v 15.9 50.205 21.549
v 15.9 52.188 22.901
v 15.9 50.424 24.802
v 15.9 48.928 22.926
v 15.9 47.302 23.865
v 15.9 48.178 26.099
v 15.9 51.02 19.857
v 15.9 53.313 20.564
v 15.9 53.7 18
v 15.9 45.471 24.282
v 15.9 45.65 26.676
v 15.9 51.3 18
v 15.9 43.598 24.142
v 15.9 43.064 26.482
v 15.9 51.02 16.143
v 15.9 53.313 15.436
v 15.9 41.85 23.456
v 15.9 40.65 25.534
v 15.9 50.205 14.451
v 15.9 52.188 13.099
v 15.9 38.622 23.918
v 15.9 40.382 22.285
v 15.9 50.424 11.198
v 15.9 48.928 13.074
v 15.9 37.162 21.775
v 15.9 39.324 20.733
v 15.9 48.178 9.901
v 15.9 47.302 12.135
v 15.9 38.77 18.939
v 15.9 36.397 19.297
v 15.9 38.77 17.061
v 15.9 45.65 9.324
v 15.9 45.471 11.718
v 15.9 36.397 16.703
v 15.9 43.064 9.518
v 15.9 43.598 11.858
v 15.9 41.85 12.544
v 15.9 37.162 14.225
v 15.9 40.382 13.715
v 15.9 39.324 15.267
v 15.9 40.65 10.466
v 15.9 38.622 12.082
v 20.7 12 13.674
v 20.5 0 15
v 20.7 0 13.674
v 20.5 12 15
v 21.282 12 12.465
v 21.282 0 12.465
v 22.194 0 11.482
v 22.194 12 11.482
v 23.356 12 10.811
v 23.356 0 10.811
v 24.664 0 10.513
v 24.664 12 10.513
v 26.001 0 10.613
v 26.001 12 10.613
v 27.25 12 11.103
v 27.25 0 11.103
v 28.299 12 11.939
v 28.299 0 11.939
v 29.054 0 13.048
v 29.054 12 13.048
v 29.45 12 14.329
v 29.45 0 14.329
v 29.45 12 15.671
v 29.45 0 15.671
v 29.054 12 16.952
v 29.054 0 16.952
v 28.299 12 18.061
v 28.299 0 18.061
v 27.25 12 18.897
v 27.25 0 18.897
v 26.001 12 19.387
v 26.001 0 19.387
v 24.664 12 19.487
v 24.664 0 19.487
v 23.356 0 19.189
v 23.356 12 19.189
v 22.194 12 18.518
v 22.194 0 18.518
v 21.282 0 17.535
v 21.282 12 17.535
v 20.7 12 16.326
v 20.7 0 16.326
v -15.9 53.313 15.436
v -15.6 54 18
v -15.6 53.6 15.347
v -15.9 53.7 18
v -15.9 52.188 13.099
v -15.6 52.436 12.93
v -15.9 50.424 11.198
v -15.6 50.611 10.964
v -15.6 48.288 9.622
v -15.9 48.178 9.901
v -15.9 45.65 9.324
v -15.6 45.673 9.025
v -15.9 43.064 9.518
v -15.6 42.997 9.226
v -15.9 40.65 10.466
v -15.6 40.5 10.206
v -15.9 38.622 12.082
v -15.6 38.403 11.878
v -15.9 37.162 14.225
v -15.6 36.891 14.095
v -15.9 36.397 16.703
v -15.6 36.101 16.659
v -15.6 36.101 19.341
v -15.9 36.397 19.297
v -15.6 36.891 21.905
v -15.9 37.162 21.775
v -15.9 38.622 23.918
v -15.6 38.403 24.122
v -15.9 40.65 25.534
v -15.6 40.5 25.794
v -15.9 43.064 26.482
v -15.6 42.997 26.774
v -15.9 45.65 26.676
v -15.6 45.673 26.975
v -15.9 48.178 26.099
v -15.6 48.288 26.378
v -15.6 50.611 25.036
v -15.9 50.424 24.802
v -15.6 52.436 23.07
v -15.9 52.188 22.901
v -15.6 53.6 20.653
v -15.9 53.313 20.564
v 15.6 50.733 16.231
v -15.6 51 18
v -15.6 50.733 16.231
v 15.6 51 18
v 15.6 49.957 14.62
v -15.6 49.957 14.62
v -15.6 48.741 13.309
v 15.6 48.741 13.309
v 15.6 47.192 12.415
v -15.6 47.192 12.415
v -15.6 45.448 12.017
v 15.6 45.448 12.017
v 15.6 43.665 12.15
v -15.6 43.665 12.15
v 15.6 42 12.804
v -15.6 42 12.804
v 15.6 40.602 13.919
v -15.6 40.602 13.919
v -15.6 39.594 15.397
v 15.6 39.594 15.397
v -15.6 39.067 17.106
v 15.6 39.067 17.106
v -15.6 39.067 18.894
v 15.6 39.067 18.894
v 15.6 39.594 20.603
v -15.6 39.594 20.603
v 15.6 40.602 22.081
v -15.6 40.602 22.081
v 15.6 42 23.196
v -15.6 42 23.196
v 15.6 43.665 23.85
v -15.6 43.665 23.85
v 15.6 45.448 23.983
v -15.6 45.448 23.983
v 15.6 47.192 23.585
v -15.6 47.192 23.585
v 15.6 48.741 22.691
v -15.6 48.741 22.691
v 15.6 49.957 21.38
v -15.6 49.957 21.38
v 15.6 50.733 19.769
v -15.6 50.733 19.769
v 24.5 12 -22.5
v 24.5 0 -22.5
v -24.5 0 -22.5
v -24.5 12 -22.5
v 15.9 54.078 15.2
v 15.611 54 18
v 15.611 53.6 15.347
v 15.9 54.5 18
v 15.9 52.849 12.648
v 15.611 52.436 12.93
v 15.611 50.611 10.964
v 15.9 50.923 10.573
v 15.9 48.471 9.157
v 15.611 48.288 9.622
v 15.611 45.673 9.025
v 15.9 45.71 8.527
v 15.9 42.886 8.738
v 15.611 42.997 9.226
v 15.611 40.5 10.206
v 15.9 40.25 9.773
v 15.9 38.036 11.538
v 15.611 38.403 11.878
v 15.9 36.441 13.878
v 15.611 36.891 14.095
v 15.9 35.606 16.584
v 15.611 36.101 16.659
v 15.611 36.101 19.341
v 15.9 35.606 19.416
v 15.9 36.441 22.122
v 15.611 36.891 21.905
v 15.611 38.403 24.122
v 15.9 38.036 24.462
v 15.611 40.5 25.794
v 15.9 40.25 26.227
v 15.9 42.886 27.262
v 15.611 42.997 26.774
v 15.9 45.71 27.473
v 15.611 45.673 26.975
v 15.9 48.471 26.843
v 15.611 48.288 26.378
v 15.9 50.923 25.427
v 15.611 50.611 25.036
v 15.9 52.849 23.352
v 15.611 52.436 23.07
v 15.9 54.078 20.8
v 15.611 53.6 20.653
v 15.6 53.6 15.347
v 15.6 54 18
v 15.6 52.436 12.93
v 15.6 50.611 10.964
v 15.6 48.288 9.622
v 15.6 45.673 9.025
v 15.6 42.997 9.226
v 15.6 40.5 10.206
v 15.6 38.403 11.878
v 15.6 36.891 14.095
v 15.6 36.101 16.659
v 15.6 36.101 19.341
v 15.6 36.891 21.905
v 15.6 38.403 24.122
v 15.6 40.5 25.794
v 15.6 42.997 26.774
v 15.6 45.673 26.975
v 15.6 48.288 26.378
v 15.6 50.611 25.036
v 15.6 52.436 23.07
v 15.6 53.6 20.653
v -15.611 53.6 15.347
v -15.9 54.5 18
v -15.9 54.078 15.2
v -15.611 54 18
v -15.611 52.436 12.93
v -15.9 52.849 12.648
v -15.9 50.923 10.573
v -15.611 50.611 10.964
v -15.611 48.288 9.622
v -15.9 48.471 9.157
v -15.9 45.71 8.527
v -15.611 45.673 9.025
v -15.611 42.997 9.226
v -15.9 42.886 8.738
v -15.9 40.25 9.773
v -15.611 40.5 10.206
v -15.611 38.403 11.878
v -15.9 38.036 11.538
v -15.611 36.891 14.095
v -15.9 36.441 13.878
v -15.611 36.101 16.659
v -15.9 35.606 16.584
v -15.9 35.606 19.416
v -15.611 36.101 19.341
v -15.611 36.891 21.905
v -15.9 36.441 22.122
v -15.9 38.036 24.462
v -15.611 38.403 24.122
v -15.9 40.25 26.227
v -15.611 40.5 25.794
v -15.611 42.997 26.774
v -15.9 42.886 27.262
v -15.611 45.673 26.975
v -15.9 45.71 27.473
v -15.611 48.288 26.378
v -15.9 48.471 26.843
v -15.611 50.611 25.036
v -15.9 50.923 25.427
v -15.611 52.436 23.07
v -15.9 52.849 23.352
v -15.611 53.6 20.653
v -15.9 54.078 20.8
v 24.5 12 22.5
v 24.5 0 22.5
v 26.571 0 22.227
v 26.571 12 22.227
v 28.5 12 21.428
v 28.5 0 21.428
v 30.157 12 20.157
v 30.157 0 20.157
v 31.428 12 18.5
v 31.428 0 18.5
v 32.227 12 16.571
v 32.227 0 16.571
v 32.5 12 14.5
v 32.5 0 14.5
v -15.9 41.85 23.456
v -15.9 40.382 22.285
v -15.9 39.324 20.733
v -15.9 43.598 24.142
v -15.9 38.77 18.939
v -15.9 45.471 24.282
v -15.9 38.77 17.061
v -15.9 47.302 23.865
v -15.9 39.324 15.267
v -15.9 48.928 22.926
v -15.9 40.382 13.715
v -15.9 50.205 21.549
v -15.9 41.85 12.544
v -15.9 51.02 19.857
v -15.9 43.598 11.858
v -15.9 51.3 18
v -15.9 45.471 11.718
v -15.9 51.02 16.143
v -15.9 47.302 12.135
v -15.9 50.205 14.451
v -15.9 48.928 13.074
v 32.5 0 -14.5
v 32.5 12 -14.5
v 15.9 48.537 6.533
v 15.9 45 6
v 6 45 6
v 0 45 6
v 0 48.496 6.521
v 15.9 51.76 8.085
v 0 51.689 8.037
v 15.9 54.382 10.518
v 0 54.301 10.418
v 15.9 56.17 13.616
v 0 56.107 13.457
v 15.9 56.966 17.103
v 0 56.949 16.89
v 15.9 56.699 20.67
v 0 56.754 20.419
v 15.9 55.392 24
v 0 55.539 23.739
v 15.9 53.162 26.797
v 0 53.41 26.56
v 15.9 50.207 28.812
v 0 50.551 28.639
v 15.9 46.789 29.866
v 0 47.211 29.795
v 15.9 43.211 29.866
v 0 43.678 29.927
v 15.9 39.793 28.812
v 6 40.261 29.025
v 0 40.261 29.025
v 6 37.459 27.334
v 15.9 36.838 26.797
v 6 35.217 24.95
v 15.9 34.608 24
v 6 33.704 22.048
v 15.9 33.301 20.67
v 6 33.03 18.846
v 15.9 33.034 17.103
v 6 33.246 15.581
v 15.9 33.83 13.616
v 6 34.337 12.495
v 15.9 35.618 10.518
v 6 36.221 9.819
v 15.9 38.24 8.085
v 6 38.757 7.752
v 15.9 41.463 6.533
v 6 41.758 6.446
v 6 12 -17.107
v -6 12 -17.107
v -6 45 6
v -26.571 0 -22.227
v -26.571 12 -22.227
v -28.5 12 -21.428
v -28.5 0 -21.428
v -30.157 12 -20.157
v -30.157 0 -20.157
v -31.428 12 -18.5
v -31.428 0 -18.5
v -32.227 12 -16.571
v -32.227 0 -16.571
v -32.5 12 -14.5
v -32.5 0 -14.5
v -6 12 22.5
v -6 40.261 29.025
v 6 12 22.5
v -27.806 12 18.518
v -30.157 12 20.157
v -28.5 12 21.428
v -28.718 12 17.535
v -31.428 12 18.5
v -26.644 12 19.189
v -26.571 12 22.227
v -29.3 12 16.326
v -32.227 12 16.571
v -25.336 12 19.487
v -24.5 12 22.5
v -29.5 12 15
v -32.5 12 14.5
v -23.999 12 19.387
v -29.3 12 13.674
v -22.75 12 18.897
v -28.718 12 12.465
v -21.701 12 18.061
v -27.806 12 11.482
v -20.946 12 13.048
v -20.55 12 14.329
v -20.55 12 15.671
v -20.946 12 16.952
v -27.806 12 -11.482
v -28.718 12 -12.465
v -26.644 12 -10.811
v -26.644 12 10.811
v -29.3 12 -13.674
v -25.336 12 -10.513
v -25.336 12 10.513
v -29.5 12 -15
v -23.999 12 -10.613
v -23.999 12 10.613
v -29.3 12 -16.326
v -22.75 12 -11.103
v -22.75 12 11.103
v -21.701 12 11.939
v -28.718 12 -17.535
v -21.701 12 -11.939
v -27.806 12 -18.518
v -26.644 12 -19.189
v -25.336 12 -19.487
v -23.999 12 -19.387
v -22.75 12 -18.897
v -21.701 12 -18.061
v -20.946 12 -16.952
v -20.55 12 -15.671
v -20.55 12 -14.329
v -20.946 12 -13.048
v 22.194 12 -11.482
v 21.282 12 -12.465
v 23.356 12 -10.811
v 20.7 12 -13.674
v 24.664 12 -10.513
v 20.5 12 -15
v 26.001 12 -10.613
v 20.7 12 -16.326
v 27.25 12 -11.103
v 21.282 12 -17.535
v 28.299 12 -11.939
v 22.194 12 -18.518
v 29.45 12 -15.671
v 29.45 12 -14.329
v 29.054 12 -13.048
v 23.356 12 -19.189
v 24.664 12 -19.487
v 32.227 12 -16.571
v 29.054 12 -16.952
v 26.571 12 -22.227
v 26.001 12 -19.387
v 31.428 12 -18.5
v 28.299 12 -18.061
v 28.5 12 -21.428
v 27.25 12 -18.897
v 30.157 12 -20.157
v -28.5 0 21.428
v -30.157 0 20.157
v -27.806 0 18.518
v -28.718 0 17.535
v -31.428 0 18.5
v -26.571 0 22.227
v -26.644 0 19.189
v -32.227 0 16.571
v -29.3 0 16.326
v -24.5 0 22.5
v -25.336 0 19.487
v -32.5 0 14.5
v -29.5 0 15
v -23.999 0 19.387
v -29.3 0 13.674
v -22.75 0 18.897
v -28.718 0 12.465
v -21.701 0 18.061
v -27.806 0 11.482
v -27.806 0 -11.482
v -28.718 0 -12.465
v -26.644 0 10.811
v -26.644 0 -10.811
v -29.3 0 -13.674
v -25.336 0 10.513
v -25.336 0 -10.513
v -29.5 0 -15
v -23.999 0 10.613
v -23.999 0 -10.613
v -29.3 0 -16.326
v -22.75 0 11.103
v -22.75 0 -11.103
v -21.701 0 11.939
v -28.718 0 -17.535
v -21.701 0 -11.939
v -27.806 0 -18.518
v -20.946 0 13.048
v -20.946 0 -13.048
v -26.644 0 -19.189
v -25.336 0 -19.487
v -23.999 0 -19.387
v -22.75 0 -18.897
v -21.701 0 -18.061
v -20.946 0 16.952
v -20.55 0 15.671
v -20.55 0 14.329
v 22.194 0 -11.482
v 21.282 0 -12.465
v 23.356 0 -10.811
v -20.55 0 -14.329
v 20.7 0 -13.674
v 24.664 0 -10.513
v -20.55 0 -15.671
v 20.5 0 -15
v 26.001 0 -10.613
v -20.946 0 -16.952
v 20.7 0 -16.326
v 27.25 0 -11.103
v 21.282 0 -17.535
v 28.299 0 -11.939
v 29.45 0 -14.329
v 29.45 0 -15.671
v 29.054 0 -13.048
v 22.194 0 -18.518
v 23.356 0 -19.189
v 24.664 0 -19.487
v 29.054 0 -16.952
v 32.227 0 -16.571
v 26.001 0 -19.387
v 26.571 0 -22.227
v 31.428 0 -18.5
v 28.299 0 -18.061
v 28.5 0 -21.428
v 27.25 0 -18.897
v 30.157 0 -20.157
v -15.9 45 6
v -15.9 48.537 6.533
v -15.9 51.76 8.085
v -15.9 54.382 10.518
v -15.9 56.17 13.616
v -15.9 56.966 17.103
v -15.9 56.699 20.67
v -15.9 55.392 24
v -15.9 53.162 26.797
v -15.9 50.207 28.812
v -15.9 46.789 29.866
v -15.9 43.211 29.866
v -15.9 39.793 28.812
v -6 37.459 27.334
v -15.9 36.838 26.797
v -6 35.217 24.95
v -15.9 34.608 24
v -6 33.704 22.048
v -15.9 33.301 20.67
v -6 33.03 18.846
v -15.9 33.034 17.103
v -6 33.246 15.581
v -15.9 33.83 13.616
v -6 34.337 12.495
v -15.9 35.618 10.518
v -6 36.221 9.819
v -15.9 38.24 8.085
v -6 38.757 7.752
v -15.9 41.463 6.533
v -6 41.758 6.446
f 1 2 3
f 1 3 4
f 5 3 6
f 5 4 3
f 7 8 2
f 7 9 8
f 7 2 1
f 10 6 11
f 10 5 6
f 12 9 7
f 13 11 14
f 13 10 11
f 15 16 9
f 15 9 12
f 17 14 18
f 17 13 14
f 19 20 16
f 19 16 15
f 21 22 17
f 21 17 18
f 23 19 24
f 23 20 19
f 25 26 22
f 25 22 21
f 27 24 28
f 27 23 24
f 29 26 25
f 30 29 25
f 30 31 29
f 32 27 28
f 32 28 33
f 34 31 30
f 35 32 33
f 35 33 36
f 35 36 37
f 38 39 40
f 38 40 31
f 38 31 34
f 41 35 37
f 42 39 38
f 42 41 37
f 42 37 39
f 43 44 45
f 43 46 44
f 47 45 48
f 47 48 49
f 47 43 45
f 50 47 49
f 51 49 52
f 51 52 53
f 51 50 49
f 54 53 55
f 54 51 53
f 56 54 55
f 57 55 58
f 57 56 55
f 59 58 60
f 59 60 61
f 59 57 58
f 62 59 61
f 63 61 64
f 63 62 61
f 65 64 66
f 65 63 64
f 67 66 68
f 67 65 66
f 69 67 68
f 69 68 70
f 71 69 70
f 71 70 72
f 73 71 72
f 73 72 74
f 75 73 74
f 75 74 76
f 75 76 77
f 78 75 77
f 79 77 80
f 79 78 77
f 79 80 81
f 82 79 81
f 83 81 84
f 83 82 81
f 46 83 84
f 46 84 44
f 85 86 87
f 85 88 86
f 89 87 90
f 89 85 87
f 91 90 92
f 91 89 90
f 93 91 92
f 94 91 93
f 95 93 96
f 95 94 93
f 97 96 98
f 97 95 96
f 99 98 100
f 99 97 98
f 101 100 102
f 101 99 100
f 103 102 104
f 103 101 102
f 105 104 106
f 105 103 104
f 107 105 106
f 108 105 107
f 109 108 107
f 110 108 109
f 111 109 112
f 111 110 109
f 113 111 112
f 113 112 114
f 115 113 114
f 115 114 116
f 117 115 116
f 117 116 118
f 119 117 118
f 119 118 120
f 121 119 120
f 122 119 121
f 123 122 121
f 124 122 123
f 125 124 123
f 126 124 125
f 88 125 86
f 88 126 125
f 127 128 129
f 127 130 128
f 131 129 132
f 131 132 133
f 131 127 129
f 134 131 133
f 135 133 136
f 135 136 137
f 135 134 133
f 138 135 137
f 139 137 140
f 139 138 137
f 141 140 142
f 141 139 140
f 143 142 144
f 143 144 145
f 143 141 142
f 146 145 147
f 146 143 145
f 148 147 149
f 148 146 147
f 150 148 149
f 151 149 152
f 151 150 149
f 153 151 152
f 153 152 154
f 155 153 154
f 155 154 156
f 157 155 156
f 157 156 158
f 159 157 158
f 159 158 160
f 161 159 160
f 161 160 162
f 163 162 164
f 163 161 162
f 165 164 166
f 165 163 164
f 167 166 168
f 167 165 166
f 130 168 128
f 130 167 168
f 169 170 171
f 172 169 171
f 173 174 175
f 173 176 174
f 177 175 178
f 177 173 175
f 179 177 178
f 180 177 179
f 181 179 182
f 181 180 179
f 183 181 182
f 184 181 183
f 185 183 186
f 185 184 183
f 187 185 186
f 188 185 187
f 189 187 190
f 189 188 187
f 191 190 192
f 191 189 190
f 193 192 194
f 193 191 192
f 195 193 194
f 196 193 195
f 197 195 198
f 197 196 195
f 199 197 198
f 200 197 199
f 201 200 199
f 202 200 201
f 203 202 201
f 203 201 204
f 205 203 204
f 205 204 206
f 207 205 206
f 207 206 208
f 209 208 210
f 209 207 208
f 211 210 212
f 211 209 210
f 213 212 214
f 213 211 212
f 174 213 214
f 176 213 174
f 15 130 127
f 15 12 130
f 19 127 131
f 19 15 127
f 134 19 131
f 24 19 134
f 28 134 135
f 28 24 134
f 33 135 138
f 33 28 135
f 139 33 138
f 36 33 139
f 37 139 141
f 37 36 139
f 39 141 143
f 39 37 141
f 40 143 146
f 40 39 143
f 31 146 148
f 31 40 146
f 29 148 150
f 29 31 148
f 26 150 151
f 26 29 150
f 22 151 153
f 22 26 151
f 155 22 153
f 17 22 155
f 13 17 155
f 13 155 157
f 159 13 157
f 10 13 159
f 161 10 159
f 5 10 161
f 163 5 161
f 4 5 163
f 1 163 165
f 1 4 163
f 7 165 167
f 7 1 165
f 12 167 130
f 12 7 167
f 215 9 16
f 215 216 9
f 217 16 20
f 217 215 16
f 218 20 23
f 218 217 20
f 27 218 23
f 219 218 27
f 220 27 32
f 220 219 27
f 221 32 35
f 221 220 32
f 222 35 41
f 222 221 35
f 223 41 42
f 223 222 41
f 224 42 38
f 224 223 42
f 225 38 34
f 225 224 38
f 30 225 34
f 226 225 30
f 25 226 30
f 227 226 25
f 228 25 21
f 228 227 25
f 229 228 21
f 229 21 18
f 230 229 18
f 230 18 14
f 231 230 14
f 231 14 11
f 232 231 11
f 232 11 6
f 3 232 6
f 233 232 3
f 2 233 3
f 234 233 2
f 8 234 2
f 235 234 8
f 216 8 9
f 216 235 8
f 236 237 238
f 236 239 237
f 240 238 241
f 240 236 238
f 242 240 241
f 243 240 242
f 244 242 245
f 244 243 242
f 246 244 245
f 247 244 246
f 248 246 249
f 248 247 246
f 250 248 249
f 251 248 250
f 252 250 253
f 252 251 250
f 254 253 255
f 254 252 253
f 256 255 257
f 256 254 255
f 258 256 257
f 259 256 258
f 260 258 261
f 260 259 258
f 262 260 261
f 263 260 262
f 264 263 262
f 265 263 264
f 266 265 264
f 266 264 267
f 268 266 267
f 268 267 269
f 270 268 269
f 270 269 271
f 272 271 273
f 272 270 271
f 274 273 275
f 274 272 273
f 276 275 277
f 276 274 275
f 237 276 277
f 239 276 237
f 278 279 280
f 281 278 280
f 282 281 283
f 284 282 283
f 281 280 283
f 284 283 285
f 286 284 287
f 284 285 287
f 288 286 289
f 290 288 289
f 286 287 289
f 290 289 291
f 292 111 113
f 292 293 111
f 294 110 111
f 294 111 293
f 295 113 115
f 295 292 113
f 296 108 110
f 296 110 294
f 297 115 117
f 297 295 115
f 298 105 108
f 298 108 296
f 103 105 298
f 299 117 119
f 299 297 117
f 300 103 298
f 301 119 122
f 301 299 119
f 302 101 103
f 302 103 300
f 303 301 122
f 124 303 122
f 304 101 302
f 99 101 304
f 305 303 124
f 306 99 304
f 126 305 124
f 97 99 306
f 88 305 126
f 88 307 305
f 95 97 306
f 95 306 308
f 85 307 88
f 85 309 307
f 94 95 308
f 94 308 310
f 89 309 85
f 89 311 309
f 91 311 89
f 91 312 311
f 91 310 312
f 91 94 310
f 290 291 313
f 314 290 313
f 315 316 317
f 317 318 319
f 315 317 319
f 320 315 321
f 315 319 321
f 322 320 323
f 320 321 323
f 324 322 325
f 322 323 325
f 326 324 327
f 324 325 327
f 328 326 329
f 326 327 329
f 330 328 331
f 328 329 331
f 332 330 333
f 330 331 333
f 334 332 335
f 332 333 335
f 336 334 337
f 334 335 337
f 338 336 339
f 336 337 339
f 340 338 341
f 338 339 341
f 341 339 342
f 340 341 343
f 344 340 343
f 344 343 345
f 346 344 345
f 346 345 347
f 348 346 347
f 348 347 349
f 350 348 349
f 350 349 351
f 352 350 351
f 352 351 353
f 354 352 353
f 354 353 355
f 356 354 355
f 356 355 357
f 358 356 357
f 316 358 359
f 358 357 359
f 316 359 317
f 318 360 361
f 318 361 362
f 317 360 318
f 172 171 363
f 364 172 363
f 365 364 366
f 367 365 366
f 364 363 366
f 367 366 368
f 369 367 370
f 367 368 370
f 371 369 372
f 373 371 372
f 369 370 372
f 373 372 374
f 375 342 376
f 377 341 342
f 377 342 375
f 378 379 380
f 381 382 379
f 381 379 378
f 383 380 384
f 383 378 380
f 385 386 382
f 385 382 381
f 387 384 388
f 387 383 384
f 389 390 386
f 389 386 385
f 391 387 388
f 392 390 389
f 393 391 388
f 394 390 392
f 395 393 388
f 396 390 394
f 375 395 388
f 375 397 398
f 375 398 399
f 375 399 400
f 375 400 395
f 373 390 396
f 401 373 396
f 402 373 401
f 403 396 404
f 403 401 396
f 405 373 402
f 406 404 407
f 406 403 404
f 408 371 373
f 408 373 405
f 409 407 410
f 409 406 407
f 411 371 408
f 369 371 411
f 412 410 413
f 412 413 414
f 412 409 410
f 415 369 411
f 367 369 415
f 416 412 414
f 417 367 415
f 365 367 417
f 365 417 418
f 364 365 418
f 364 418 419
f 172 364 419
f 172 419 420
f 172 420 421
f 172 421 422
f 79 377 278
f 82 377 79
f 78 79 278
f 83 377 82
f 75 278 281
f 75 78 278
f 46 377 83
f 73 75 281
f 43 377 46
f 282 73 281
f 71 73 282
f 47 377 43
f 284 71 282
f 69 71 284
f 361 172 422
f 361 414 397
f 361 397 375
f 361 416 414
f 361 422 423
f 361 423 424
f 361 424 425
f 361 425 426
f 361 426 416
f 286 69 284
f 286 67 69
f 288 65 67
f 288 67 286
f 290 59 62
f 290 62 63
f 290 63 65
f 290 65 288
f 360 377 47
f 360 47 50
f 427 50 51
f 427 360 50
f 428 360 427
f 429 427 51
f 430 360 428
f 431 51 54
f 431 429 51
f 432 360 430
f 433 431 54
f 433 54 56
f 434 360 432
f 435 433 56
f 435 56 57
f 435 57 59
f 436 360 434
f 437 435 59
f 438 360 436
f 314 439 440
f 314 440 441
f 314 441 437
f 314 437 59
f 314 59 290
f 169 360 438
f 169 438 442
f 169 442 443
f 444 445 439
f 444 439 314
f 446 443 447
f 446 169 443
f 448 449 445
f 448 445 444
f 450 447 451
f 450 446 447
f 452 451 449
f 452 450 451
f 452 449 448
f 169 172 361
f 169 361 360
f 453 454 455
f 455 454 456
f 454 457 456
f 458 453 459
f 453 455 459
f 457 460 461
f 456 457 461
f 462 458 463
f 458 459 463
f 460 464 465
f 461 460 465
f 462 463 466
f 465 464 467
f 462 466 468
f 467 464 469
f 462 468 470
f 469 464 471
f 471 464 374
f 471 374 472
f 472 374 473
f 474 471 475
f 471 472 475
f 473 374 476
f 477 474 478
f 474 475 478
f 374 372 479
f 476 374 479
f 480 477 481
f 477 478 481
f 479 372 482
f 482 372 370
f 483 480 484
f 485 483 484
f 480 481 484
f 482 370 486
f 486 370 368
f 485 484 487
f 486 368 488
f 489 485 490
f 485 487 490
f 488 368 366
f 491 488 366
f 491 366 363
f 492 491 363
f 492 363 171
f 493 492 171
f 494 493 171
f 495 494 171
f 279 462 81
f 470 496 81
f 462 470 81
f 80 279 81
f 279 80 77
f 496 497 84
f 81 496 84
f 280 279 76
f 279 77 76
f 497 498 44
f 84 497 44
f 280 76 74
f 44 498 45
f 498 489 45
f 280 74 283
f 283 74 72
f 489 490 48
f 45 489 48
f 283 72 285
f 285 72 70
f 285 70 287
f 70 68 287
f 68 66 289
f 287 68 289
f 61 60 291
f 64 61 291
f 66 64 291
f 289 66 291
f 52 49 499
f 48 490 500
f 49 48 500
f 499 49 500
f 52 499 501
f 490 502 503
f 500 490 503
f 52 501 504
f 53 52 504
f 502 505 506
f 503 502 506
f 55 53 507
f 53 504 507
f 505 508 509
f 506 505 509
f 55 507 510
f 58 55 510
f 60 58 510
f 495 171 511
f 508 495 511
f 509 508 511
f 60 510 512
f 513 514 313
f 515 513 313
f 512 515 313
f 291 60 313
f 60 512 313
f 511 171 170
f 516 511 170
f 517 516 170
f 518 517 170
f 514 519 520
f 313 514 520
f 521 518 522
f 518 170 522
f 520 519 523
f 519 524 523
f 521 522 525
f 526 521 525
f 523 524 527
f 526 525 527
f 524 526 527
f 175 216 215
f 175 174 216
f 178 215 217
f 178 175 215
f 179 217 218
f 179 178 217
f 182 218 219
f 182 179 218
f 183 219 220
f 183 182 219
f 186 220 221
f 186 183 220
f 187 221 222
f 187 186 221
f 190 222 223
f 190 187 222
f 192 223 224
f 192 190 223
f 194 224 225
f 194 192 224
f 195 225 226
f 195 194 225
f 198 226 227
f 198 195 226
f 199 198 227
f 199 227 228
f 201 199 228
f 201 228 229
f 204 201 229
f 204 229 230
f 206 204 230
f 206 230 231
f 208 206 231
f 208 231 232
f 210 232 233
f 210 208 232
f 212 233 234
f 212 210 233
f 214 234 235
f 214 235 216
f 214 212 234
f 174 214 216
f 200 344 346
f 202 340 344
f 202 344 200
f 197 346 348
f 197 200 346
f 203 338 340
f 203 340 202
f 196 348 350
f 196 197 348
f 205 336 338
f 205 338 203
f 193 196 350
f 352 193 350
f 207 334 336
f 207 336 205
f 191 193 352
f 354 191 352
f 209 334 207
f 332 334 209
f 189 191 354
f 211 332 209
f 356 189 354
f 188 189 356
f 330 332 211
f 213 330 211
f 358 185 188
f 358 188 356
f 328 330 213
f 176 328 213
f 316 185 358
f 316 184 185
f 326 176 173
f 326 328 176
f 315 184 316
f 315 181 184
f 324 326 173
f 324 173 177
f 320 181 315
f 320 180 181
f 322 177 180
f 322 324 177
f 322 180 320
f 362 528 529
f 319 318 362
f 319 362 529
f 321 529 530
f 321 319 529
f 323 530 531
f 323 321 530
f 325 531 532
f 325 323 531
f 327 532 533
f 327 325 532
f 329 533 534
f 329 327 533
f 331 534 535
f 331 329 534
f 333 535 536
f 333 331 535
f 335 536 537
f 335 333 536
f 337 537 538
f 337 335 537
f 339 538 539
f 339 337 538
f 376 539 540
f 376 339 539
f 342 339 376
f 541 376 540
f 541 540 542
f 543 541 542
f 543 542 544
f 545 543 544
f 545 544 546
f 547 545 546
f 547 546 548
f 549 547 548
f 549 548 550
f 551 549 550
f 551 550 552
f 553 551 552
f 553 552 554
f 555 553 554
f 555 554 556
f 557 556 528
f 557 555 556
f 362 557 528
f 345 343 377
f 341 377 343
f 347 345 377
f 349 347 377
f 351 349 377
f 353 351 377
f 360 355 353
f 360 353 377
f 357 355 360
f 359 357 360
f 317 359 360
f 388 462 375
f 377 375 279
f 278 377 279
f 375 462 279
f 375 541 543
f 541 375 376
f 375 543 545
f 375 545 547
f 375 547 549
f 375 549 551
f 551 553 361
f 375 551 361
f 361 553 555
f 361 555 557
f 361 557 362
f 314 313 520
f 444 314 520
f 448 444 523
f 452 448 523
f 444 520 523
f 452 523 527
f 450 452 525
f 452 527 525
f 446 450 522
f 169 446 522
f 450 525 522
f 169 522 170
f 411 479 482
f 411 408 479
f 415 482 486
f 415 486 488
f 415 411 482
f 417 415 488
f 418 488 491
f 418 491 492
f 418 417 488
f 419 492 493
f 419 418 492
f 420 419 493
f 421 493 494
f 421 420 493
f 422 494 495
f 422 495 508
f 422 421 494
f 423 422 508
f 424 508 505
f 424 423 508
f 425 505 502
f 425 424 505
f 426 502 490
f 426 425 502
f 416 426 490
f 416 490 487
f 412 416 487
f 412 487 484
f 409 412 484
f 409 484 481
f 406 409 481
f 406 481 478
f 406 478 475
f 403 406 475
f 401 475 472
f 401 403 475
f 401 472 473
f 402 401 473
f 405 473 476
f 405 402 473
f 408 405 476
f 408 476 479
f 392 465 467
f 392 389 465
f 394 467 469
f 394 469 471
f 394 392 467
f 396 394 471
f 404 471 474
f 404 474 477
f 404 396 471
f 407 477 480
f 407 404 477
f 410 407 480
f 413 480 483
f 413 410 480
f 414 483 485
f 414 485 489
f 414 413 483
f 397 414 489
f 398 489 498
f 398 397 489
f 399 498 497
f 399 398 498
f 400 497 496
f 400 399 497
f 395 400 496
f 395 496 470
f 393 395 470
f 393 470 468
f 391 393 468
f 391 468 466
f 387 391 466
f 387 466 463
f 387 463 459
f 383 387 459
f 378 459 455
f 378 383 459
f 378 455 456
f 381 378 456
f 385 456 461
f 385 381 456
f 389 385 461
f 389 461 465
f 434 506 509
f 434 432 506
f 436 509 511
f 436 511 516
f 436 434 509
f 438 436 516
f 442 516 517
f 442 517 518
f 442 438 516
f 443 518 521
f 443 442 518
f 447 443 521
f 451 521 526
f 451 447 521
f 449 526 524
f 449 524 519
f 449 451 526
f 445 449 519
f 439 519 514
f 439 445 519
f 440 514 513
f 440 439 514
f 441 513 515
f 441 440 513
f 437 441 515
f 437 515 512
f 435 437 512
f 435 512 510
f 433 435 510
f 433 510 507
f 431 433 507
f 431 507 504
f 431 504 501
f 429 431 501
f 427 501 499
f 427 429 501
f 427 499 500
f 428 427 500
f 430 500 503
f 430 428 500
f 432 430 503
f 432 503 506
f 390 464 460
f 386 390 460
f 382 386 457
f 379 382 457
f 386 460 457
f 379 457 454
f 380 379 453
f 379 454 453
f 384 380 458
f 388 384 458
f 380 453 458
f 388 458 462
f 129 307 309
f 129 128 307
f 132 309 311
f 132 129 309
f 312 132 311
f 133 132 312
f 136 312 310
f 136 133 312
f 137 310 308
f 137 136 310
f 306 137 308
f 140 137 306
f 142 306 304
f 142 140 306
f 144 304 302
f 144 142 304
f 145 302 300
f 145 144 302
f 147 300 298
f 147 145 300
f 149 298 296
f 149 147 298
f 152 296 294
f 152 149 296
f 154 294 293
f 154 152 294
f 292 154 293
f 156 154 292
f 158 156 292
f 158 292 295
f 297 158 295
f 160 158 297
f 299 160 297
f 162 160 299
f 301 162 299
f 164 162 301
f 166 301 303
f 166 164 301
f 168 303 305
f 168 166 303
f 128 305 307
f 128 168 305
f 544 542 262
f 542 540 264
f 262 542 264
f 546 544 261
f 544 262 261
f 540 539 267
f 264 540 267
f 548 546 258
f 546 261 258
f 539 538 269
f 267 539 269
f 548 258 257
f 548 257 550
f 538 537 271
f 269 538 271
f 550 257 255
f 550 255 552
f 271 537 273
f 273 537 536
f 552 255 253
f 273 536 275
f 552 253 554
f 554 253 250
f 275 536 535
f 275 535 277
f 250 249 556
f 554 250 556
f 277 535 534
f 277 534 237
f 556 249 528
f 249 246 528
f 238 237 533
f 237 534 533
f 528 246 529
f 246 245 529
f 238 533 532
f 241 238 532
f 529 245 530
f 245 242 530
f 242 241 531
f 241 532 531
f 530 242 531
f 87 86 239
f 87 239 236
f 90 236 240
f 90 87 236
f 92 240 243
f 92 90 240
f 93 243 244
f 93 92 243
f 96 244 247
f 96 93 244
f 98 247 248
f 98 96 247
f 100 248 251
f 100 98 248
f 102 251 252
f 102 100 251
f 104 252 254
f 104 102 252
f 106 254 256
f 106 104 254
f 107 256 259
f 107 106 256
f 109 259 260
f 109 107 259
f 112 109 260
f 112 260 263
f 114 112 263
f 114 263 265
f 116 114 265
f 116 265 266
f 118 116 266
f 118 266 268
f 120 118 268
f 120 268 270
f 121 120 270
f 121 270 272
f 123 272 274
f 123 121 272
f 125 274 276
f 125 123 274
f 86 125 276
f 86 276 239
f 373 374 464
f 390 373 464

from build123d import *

# Parameters (mm, degrees)
BOSS_EXTRUDE1_DEPTH      = 12
BOSS_EXTRUDE2_DEPTH      = 6
BOSS_EXTRUDE2_DEPTH_BACK = 6
SKETCH3_R                = 12
BOSS_EXTRUDE3_DEPTH      = 15.9
BOSS_EXTRUDE3_DEPTH_BACK = 15.9
SKETCH4_W                = 4.5
SKETCH4_H                = 12
SKETCH5_W                = 4.5
SKETCH5_H                = 12
SKETCH6_W                = 4.5
SKETCH6_H                = 12
SKETCH7_W                = 4.5
SKETCH7_H                = 12


with BuildPart() as part:
    # Sketch1 → Boss-Extrude1 (new body)
    with BuildSketch(Plane(origin=(0, 0, 0), x_dir=(1, 0, 0), z_dir=(0, 1, 0))):
        with BuildLine():
            Line((-24.5, -22.5), (24.5, -22.5))
            ThreePointArc((24.5, -22.5), (30.156854249, -20.156854249), (32.5, -14.5))
            Line((32.5, -14.5), (32.5, 14.5))
            ThreePointArc((32.5, 14.5), (30.156854249, 20.156854249), (24.5, 22.5))
            Line((24.5, 22.5), (-24.5, 22.5))
            ThreePointArc((-24.5, 22.5), (-30.156854249, 20.156854249), (-32.5, 14.5))
            Line((-32.5, 14.5), (-32.5, -14.5))
            ThreePointArc((-32.5, -14.5), (-30.156854249, -20.156854249), (-24.5, -22.5))
        make_face()
    extrude(amount=BOSS_EXTRUDE1_DEPTH)

    # Sketch2 → Boss-Extrude2 (add, two sides)
    with BuildSketch(Plane(origin=(0, 0, 0), x_dir=(0, 0, -1), z_dir=(1, 0, 0))) as boss_extrude2_sk:
        Polygon((-29.505410526, 42.343766684), (-22.5, 12), (17.106848761, 12), (-7.669916362, 47.384887724), align=None)
    extrude(amount=BOSS_EXTRUDE2_DEPTH)
    extrude(boss_extrude2_sk.sketch, amount=-BOSS_EXTRUDE2_DEPTH_BACK)

    # Sketch3 → Boss-Extrude3 (add, two sides)
    with BuildSketch(Plane(origin=(0, 0, 0), x_dir=(0, 0, -1), z_dir=(1, 0, 0))) as boss_extrude3_sk:
        with Locations((-18, 45)):
            Circle(SKETCH3_R)
    extrude(amount=BOSS_EXTRUDE3_DEPTH)
    extrude(boss_extrude3_sk.sketch, amount=-BOSS_EXTRUDE3_DEPTH_BACK)

    # Sketch4 → Cut-Revolve1 (revolve, cut)
    with BuildSketch(Plane.XY.offset(15)):
        with Locations((-27.25, 6)):
            Rectangle(SKETCH4_W, SKETCH4_H)
    revolve(axis=Axis((-25, 12, 15), (0, -1, 0)), mode=Mode.SUBTRACT)

    # Sketch5 → Cut-Revolve2 (revolve, cut)
    with BuildSketch(Plane.XY.offset(15)):
        with Locations((22.75, 6)):
            Rectangle(SKETCH5_W, SKETCH5_H)
    revolve(axis=Axis((25, 12, 15), (0, -1, 0)), mode=Mode.SUBTRACT)

    # Sketch6 → Cut-Revolve3 (revolve, cut)
    with BuildSketch(Plane.XY.offset(-15)):
        with Locations((-27.25, 6)):
            Rectangle(SKETCH6_W, SKETCH6_H)
    revolve(axis=Axis((-25, 12, -15), (0, -1, 0)), mode=Mode.SUBTRACT)

    # Sketch7 → Cut-Revolve4 (revolve, cut)
    with BuildSketch(Plane.XY.offset(-15)):
        with Locations((22.75, 6)):
            Rectangle(SKETCH7_W, SKETCH7_H)
    revolve(axis=Axis((25, 12, -15), (0, -1, 0)), mode=Mode.SUBTRACT)

    # Sketch8 → Cut-Revolve5 (revolve, cut)
    with BuildSketch(Plane.XY.offset(18)):
        Polygon((-15.9, 45), (-15.9, 54.5), (-15.611324865, 54), (15.611324865, 54), (15.9, 54.5), (15.9, 45), align=None)
    revolve(axis=Axis((15.9, 45, 18), (-1, 0, 0)), mode=Mode.SUBTRACT)

    # Sketch9 → Revolve1 (revolve)
    with BuildSketch(Plane.XY.offset(18)):
        Polygon((-15.9, 51.3), (-15.6, 51), (15.6, 51), (15.9, 51.3), (15.9, 53.7), (15.6, 54), (-15.6, 54), (-15.9, 53.7), align=None)
    revolve(axis=Axis((15.9, 45, 18), (-1, 0, 0)))


solid = part.part
